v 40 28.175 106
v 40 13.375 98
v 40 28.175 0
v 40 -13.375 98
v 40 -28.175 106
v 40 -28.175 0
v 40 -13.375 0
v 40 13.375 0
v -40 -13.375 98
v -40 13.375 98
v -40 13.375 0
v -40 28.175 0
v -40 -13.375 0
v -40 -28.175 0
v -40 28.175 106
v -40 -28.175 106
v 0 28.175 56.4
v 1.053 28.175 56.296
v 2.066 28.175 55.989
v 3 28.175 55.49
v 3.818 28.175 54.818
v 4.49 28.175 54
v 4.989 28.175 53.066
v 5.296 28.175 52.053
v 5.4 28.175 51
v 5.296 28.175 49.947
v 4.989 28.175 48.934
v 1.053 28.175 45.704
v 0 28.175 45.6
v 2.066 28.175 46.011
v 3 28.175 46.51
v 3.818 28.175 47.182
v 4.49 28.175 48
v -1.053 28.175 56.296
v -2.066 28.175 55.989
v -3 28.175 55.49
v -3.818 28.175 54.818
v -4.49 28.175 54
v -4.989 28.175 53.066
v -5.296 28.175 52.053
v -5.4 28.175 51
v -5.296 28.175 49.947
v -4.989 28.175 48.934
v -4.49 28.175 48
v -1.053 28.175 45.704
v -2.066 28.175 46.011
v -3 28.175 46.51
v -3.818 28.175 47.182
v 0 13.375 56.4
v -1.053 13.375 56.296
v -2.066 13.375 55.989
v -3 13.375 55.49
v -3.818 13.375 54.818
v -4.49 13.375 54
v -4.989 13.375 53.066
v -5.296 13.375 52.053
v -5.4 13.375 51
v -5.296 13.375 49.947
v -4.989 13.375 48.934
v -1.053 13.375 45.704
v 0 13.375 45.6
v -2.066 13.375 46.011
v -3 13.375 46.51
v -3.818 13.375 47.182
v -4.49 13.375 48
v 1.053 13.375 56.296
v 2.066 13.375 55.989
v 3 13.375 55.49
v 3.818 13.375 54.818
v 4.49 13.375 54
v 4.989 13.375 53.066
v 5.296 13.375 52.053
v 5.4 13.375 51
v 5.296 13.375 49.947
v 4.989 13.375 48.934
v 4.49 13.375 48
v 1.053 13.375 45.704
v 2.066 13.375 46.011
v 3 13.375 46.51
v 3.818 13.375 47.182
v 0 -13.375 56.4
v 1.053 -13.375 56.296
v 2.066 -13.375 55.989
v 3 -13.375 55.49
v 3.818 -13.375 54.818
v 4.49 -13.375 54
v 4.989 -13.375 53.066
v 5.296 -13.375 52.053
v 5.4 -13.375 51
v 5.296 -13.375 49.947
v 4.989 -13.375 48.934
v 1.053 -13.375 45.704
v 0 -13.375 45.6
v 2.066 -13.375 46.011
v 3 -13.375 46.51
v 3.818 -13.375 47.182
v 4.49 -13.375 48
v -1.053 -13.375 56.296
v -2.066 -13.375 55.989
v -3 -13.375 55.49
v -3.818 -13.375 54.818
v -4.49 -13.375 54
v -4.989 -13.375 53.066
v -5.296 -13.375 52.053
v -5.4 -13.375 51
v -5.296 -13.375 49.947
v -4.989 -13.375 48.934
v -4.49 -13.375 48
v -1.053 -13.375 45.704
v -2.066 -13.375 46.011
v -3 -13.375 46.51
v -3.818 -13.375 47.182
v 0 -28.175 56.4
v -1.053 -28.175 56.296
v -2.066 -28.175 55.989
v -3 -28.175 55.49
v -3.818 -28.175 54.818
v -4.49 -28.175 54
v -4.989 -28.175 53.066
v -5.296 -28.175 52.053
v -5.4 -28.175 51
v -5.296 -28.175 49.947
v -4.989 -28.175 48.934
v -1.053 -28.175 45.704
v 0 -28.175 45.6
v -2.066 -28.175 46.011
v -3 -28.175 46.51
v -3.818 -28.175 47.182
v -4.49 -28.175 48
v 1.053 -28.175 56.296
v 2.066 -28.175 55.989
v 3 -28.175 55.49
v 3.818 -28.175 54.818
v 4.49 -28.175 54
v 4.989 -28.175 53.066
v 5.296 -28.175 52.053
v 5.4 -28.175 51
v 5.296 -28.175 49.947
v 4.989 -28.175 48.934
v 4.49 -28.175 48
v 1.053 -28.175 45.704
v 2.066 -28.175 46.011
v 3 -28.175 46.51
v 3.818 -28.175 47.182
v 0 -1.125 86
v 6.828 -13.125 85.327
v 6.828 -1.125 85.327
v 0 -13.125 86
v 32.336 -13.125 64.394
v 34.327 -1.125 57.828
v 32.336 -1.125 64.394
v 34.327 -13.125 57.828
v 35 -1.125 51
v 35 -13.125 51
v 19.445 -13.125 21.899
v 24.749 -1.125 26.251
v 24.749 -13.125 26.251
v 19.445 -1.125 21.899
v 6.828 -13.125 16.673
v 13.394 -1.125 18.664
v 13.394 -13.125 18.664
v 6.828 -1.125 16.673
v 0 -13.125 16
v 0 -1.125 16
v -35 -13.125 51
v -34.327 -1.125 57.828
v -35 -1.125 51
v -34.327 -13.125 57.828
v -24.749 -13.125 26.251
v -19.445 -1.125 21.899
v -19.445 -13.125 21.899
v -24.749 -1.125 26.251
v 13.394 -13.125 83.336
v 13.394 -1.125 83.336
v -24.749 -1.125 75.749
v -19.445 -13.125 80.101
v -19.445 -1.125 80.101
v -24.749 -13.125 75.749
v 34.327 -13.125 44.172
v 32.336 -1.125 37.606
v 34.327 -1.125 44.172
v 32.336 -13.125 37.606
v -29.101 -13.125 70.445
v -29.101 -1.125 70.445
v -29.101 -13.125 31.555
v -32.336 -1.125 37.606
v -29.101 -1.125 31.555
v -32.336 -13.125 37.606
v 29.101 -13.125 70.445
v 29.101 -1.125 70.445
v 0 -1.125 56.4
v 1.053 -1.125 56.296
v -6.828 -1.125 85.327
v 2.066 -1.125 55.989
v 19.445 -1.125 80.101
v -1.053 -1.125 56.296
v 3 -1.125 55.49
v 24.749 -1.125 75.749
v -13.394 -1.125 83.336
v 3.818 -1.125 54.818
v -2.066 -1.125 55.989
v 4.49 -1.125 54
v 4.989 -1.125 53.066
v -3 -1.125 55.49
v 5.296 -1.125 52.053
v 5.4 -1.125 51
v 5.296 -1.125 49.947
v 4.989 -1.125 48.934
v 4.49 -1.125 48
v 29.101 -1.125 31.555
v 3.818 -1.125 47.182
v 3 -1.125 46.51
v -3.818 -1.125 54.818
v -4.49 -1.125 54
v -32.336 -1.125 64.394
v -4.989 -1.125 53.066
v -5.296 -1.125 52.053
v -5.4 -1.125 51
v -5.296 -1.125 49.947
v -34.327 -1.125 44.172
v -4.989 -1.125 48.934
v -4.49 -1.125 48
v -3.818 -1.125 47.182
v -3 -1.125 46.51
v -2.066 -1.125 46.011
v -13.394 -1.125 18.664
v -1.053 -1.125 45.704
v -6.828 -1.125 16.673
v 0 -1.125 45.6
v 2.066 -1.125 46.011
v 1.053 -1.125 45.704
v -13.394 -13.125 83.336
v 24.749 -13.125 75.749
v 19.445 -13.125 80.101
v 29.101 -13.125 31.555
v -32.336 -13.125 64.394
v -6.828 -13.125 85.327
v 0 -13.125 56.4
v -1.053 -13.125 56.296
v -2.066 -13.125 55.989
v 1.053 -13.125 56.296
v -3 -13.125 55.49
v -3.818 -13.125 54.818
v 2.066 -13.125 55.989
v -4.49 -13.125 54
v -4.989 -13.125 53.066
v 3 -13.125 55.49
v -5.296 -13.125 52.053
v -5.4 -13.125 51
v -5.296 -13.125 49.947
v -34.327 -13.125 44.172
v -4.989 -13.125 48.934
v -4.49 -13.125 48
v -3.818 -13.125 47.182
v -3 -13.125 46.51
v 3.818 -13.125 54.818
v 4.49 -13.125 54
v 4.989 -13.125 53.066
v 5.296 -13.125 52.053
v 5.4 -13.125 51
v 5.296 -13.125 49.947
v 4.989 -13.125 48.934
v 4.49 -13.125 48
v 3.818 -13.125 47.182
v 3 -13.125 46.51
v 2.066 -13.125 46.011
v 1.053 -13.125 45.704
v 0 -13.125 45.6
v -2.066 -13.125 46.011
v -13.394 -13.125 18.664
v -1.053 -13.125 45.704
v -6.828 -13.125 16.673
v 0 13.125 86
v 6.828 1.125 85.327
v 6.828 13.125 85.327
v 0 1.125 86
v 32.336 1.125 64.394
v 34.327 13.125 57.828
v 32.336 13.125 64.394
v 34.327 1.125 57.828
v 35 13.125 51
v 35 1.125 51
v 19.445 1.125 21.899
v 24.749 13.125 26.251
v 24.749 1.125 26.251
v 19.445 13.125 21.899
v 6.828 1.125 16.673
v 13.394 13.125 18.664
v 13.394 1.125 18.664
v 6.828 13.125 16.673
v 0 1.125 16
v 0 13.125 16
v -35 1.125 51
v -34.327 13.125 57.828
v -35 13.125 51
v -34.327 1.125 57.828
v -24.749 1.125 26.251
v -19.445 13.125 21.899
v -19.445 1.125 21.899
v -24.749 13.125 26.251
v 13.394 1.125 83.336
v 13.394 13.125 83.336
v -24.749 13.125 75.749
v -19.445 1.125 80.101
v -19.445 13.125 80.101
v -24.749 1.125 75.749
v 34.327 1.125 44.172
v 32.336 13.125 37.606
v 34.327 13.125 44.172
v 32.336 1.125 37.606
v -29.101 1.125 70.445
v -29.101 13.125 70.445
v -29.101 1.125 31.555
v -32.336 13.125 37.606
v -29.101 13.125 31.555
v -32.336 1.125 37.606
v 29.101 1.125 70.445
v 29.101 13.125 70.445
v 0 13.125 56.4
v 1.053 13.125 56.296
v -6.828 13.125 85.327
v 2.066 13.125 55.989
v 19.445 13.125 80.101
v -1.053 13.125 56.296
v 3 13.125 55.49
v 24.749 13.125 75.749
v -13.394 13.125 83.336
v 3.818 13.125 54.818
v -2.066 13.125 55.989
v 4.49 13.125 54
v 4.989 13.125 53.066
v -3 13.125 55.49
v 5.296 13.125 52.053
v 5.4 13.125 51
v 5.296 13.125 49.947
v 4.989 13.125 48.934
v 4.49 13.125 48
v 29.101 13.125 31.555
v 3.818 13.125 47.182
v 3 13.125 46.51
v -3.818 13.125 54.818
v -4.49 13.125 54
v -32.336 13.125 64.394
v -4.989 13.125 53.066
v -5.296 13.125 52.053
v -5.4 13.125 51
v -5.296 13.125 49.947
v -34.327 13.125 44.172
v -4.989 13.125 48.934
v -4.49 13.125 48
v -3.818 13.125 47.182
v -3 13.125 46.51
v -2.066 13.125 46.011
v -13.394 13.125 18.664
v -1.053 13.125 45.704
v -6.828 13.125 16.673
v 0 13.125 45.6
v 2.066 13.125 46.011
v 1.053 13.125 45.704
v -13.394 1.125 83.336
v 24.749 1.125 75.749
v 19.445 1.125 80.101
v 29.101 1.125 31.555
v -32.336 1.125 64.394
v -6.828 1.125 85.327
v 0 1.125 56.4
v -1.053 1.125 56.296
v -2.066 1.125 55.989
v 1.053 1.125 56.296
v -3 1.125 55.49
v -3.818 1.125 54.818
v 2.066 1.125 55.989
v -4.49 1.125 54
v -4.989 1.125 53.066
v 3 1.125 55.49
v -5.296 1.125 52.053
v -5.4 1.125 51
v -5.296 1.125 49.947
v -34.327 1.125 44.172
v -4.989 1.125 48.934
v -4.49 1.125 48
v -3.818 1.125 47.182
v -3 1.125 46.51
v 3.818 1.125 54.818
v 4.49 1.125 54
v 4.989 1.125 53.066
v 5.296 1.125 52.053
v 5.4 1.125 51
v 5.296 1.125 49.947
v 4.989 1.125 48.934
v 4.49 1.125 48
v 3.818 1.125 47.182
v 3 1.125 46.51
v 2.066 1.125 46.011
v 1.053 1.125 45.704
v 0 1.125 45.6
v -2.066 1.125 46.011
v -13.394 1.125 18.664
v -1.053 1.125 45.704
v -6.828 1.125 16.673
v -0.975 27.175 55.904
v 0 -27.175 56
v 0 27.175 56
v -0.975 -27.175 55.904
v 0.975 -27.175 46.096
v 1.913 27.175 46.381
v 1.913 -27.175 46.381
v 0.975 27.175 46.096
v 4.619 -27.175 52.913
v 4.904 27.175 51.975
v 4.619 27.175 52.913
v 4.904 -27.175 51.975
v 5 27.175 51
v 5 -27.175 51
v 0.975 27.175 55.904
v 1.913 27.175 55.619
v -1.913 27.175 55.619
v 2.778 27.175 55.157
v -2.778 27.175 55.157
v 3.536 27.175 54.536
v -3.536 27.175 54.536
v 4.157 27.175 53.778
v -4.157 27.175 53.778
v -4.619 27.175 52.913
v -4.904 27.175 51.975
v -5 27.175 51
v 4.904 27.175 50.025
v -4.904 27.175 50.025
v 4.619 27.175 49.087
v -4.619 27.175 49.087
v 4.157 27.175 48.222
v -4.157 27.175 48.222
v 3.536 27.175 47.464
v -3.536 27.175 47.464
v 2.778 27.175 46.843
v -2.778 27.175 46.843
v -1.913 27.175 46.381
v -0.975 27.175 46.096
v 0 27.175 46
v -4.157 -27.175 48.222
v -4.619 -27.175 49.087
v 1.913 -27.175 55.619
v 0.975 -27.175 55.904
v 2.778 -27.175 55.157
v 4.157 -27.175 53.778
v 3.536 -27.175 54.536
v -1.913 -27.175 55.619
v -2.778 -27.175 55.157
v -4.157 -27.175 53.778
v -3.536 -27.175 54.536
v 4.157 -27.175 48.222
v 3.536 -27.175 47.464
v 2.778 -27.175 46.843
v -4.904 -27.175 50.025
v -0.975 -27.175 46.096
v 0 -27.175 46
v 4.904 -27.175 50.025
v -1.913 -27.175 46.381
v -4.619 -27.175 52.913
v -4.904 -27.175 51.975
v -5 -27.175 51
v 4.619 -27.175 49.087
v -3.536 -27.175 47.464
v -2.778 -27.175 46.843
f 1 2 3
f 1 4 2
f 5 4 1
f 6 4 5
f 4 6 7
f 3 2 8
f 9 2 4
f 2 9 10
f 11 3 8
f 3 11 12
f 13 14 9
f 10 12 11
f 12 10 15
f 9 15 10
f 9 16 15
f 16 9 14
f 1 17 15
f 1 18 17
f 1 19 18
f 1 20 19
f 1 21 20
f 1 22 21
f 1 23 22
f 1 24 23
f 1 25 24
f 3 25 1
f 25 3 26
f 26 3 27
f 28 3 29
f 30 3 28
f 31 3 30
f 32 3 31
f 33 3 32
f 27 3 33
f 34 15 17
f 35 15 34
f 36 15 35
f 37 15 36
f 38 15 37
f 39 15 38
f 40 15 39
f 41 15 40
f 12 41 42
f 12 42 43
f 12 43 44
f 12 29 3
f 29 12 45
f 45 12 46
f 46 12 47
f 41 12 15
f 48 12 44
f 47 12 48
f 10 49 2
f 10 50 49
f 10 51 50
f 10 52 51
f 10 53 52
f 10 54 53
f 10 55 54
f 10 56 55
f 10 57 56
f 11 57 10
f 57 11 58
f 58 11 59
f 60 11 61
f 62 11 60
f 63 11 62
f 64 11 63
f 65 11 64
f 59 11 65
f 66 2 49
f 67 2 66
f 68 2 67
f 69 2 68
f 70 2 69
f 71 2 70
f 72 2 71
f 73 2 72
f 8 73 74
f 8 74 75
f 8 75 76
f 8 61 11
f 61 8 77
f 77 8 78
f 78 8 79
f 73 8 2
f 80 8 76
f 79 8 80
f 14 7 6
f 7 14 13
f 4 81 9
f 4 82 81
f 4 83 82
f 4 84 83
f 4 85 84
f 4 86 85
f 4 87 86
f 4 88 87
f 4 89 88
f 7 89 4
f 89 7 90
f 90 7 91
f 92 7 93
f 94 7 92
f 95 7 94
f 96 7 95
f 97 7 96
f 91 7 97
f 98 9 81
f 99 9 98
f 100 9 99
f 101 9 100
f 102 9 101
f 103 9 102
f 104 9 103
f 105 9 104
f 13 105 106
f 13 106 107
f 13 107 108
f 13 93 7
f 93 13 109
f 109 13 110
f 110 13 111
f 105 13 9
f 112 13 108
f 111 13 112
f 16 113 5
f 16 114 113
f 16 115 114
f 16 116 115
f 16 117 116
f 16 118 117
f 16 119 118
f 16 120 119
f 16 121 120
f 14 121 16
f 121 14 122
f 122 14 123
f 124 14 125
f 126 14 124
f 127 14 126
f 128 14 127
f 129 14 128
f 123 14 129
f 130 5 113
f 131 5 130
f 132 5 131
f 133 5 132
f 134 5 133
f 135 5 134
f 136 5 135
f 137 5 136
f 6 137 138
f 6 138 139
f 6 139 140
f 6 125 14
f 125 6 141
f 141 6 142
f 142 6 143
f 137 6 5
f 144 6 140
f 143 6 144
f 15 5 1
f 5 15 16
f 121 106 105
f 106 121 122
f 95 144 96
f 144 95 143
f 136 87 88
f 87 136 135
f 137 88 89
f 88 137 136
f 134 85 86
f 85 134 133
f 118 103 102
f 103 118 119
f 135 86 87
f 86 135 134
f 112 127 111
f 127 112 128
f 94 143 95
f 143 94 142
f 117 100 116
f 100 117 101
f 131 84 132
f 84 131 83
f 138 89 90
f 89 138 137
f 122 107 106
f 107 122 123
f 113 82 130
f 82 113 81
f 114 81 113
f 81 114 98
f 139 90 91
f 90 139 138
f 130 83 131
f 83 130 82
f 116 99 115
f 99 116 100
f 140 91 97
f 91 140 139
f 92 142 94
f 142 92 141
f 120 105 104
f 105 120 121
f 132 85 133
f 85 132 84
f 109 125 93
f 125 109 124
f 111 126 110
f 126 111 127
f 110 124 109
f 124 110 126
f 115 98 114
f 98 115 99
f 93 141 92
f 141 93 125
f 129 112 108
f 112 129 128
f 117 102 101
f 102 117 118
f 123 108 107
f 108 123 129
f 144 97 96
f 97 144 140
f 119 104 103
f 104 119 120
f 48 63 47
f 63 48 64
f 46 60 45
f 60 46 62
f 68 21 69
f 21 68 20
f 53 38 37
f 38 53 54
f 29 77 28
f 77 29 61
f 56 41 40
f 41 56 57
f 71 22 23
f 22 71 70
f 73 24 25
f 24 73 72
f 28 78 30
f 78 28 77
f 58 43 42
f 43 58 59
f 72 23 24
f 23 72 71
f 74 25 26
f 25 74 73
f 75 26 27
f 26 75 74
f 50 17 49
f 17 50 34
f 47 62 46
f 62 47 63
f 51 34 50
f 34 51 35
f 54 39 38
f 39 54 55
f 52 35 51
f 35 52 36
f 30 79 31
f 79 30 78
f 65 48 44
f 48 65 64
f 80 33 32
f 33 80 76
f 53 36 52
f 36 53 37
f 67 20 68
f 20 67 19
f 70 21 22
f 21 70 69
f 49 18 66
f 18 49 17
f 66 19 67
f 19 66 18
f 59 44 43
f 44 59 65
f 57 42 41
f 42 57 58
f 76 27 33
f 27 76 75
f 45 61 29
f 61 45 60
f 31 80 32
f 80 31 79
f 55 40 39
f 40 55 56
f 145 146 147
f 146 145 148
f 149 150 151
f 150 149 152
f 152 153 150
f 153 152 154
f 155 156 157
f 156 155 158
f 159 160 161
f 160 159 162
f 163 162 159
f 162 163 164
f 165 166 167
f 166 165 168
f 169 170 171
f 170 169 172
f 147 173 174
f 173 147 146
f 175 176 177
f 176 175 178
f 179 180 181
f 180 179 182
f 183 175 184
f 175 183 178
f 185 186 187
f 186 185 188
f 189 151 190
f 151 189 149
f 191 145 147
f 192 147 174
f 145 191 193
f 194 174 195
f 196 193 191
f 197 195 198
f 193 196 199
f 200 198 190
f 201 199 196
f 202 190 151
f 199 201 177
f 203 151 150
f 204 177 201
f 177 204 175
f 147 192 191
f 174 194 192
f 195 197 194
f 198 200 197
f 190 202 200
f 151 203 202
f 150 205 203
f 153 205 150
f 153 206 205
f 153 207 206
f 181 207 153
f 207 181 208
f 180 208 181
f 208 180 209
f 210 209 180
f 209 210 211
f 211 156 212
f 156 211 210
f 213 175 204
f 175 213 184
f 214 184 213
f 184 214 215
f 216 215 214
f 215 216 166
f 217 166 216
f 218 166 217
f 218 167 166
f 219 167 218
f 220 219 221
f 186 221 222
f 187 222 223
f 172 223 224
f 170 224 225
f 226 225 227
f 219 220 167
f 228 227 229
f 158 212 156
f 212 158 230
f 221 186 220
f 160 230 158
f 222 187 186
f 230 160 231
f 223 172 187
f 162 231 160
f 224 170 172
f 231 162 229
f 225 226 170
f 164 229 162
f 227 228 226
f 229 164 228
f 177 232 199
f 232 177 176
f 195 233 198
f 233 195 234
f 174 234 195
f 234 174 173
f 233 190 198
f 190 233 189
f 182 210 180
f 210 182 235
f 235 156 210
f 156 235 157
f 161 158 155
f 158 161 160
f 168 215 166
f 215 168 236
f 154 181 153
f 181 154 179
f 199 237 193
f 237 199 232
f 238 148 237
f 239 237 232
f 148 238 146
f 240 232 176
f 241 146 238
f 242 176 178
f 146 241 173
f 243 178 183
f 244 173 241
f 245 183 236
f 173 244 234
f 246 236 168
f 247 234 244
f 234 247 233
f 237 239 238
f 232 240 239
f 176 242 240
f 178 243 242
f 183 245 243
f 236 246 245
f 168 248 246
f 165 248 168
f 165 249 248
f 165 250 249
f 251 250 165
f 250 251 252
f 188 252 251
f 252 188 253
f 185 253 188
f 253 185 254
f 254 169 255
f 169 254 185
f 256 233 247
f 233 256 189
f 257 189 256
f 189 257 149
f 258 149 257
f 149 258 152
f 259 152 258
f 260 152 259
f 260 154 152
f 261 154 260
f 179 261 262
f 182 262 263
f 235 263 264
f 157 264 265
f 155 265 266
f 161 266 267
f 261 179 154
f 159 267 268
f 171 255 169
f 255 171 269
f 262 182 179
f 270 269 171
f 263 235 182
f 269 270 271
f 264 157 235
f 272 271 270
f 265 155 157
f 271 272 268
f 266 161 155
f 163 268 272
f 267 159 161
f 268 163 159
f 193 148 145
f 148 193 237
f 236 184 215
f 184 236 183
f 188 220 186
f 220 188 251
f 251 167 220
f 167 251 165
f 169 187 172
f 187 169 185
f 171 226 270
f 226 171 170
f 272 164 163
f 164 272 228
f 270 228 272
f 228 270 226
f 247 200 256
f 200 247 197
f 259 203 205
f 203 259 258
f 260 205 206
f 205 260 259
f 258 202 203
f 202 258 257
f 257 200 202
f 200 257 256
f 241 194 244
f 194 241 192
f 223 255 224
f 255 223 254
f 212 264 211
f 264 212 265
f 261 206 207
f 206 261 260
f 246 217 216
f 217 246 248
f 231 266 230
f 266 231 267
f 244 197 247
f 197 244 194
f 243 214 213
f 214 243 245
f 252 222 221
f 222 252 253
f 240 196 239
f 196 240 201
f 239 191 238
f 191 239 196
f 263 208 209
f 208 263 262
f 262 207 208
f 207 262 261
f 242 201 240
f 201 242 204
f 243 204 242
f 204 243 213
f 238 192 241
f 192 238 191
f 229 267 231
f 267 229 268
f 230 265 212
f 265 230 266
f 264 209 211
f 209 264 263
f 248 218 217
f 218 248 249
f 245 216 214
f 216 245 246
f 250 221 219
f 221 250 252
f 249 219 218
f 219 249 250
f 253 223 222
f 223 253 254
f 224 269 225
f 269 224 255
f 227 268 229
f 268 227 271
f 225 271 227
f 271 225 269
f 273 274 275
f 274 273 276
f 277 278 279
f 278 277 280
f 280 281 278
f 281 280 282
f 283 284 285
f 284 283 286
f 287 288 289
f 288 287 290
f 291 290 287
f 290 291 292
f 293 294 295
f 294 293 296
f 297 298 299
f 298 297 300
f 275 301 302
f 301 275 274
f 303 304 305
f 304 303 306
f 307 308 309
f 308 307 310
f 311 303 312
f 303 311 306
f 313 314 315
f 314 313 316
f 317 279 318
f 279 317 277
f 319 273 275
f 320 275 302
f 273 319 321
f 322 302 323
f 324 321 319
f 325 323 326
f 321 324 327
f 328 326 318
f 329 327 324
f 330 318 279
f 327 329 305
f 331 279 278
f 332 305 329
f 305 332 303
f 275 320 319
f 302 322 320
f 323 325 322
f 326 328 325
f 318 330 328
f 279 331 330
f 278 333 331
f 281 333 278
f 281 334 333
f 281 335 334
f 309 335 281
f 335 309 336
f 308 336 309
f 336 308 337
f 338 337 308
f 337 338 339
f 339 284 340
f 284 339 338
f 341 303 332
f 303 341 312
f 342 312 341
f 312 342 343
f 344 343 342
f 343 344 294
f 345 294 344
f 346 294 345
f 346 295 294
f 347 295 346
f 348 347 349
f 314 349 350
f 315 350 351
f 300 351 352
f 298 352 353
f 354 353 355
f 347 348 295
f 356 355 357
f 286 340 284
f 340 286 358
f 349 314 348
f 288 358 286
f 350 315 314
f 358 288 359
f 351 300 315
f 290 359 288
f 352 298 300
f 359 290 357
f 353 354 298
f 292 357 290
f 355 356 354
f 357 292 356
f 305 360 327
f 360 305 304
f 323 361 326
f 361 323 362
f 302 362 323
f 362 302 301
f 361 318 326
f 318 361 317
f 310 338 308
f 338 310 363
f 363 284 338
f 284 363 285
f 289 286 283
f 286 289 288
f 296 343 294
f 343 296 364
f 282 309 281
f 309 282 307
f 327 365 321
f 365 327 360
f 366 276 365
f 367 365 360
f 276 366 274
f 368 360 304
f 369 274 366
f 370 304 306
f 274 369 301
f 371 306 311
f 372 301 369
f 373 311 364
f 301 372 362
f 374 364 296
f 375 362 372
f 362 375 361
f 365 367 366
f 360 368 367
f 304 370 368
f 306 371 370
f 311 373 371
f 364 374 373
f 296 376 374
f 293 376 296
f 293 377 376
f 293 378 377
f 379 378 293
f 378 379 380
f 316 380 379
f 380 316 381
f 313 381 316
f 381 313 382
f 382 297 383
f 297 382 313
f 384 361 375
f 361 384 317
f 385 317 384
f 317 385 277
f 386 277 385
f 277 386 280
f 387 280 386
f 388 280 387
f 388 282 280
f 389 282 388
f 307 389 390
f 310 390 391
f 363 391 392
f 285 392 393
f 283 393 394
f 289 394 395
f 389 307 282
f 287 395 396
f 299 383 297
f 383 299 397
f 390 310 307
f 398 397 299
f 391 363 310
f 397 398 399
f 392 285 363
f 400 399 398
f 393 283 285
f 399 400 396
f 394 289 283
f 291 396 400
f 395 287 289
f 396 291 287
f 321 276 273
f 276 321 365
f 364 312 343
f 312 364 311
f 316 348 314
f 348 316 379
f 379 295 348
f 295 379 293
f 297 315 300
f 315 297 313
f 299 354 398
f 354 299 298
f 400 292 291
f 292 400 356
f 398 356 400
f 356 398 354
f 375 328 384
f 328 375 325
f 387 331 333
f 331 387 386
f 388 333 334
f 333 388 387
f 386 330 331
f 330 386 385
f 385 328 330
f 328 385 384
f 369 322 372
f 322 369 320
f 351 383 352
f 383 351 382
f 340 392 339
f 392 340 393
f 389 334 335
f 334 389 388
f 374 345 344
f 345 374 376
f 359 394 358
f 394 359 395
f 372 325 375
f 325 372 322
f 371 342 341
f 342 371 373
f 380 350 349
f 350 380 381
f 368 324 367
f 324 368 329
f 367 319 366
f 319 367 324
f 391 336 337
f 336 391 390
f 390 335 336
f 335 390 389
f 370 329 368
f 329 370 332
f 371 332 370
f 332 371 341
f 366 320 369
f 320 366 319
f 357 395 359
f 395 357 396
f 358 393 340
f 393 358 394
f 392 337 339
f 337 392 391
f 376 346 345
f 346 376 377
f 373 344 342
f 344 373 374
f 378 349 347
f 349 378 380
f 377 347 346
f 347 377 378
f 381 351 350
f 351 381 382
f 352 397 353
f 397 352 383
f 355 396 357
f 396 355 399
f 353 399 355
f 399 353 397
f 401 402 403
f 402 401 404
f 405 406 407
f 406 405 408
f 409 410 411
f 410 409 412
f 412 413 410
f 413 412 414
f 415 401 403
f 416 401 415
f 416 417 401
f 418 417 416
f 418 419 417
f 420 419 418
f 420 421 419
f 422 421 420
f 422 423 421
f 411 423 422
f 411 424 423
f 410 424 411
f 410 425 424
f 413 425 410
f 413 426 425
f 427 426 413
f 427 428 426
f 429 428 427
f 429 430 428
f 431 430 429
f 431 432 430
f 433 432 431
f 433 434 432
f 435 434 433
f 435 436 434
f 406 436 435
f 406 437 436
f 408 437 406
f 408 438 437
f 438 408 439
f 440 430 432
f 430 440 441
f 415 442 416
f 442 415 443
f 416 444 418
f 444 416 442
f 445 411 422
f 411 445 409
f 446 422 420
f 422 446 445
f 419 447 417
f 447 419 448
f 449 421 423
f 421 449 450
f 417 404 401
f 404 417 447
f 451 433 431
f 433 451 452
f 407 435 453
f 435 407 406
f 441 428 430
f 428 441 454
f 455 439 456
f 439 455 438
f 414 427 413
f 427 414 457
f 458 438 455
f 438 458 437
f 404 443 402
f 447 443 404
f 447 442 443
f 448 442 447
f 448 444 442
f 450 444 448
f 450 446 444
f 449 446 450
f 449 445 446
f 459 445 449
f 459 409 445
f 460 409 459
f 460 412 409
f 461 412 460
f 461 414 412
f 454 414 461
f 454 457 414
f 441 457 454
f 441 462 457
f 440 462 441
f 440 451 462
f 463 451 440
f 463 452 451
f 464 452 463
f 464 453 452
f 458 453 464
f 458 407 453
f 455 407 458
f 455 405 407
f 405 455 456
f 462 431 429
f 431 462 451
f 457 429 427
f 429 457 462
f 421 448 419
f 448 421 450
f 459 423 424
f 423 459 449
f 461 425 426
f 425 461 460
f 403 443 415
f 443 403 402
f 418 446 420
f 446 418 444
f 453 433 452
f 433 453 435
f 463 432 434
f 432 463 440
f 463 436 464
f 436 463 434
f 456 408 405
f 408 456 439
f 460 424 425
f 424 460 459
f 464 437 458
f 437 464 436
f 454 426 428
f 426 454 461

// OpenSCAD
$fn = 32;

// ------------------------------------------------------------------------
// Trolley wheel set: wheels d70, fork 98 mm tall
// Every part is its own module, assembly() places every instance.
// ------------------------------------------------------------------------

// --- part 1 ---
module trolley_fork() {
  difference() {
    union() {
      translate([-40, 13.375, 0]) cube([80, 14.8, 98]);
      translate([-40, -28.175, 0]) cube([80, 14.8, 98]);
      translate([-40, -28.175, 98]) cube([80, 56.35, 8]);
    }
    translate([0, -20.775, 51]) rotate([90, 0, 0]) cylinder(h = 16.8, d = 10.8, center = true);
    translate([0, 20.775, 51]) rotate([90, 0, 0]) cylinder(h = 16.8, d = 10.8, center = true);
  }
}

// --- part 2 ---
module trolley_wheel() {
  difference() {
      translate([0, 0, 0]) cylinder(h = 12, d = 70);
      translate([0, 0, -1]) cylinder(h = 14, d = 10.8);
    }
}

// --- part 3 ---
module trolley_axle() {
  translate([0, 0, -27.175]) cylinder(h = 54.35, d = 10);
}

// --- assembly ---
module assembly() {
  color([0.80, 0.24, 0.20]) translate([0, 0, 0]) rotate([0, 0, 0]) trolley_fork();
  color([0.20, 0.45, 0.75]) translate([0, -1.125, 51]) rotate([90, 0, 0]) trolley_wheel();
  color([0.25, 0.62, 0.32]) translate([0, 13.125, 51]) rotate([90, 0, 0]) trolley_wheel();
  color([0.92, 0.70, 0.18]) translate([0, 0, 51]) rotate([90, 0, 0]) trolley_axle();
}

assembly();
